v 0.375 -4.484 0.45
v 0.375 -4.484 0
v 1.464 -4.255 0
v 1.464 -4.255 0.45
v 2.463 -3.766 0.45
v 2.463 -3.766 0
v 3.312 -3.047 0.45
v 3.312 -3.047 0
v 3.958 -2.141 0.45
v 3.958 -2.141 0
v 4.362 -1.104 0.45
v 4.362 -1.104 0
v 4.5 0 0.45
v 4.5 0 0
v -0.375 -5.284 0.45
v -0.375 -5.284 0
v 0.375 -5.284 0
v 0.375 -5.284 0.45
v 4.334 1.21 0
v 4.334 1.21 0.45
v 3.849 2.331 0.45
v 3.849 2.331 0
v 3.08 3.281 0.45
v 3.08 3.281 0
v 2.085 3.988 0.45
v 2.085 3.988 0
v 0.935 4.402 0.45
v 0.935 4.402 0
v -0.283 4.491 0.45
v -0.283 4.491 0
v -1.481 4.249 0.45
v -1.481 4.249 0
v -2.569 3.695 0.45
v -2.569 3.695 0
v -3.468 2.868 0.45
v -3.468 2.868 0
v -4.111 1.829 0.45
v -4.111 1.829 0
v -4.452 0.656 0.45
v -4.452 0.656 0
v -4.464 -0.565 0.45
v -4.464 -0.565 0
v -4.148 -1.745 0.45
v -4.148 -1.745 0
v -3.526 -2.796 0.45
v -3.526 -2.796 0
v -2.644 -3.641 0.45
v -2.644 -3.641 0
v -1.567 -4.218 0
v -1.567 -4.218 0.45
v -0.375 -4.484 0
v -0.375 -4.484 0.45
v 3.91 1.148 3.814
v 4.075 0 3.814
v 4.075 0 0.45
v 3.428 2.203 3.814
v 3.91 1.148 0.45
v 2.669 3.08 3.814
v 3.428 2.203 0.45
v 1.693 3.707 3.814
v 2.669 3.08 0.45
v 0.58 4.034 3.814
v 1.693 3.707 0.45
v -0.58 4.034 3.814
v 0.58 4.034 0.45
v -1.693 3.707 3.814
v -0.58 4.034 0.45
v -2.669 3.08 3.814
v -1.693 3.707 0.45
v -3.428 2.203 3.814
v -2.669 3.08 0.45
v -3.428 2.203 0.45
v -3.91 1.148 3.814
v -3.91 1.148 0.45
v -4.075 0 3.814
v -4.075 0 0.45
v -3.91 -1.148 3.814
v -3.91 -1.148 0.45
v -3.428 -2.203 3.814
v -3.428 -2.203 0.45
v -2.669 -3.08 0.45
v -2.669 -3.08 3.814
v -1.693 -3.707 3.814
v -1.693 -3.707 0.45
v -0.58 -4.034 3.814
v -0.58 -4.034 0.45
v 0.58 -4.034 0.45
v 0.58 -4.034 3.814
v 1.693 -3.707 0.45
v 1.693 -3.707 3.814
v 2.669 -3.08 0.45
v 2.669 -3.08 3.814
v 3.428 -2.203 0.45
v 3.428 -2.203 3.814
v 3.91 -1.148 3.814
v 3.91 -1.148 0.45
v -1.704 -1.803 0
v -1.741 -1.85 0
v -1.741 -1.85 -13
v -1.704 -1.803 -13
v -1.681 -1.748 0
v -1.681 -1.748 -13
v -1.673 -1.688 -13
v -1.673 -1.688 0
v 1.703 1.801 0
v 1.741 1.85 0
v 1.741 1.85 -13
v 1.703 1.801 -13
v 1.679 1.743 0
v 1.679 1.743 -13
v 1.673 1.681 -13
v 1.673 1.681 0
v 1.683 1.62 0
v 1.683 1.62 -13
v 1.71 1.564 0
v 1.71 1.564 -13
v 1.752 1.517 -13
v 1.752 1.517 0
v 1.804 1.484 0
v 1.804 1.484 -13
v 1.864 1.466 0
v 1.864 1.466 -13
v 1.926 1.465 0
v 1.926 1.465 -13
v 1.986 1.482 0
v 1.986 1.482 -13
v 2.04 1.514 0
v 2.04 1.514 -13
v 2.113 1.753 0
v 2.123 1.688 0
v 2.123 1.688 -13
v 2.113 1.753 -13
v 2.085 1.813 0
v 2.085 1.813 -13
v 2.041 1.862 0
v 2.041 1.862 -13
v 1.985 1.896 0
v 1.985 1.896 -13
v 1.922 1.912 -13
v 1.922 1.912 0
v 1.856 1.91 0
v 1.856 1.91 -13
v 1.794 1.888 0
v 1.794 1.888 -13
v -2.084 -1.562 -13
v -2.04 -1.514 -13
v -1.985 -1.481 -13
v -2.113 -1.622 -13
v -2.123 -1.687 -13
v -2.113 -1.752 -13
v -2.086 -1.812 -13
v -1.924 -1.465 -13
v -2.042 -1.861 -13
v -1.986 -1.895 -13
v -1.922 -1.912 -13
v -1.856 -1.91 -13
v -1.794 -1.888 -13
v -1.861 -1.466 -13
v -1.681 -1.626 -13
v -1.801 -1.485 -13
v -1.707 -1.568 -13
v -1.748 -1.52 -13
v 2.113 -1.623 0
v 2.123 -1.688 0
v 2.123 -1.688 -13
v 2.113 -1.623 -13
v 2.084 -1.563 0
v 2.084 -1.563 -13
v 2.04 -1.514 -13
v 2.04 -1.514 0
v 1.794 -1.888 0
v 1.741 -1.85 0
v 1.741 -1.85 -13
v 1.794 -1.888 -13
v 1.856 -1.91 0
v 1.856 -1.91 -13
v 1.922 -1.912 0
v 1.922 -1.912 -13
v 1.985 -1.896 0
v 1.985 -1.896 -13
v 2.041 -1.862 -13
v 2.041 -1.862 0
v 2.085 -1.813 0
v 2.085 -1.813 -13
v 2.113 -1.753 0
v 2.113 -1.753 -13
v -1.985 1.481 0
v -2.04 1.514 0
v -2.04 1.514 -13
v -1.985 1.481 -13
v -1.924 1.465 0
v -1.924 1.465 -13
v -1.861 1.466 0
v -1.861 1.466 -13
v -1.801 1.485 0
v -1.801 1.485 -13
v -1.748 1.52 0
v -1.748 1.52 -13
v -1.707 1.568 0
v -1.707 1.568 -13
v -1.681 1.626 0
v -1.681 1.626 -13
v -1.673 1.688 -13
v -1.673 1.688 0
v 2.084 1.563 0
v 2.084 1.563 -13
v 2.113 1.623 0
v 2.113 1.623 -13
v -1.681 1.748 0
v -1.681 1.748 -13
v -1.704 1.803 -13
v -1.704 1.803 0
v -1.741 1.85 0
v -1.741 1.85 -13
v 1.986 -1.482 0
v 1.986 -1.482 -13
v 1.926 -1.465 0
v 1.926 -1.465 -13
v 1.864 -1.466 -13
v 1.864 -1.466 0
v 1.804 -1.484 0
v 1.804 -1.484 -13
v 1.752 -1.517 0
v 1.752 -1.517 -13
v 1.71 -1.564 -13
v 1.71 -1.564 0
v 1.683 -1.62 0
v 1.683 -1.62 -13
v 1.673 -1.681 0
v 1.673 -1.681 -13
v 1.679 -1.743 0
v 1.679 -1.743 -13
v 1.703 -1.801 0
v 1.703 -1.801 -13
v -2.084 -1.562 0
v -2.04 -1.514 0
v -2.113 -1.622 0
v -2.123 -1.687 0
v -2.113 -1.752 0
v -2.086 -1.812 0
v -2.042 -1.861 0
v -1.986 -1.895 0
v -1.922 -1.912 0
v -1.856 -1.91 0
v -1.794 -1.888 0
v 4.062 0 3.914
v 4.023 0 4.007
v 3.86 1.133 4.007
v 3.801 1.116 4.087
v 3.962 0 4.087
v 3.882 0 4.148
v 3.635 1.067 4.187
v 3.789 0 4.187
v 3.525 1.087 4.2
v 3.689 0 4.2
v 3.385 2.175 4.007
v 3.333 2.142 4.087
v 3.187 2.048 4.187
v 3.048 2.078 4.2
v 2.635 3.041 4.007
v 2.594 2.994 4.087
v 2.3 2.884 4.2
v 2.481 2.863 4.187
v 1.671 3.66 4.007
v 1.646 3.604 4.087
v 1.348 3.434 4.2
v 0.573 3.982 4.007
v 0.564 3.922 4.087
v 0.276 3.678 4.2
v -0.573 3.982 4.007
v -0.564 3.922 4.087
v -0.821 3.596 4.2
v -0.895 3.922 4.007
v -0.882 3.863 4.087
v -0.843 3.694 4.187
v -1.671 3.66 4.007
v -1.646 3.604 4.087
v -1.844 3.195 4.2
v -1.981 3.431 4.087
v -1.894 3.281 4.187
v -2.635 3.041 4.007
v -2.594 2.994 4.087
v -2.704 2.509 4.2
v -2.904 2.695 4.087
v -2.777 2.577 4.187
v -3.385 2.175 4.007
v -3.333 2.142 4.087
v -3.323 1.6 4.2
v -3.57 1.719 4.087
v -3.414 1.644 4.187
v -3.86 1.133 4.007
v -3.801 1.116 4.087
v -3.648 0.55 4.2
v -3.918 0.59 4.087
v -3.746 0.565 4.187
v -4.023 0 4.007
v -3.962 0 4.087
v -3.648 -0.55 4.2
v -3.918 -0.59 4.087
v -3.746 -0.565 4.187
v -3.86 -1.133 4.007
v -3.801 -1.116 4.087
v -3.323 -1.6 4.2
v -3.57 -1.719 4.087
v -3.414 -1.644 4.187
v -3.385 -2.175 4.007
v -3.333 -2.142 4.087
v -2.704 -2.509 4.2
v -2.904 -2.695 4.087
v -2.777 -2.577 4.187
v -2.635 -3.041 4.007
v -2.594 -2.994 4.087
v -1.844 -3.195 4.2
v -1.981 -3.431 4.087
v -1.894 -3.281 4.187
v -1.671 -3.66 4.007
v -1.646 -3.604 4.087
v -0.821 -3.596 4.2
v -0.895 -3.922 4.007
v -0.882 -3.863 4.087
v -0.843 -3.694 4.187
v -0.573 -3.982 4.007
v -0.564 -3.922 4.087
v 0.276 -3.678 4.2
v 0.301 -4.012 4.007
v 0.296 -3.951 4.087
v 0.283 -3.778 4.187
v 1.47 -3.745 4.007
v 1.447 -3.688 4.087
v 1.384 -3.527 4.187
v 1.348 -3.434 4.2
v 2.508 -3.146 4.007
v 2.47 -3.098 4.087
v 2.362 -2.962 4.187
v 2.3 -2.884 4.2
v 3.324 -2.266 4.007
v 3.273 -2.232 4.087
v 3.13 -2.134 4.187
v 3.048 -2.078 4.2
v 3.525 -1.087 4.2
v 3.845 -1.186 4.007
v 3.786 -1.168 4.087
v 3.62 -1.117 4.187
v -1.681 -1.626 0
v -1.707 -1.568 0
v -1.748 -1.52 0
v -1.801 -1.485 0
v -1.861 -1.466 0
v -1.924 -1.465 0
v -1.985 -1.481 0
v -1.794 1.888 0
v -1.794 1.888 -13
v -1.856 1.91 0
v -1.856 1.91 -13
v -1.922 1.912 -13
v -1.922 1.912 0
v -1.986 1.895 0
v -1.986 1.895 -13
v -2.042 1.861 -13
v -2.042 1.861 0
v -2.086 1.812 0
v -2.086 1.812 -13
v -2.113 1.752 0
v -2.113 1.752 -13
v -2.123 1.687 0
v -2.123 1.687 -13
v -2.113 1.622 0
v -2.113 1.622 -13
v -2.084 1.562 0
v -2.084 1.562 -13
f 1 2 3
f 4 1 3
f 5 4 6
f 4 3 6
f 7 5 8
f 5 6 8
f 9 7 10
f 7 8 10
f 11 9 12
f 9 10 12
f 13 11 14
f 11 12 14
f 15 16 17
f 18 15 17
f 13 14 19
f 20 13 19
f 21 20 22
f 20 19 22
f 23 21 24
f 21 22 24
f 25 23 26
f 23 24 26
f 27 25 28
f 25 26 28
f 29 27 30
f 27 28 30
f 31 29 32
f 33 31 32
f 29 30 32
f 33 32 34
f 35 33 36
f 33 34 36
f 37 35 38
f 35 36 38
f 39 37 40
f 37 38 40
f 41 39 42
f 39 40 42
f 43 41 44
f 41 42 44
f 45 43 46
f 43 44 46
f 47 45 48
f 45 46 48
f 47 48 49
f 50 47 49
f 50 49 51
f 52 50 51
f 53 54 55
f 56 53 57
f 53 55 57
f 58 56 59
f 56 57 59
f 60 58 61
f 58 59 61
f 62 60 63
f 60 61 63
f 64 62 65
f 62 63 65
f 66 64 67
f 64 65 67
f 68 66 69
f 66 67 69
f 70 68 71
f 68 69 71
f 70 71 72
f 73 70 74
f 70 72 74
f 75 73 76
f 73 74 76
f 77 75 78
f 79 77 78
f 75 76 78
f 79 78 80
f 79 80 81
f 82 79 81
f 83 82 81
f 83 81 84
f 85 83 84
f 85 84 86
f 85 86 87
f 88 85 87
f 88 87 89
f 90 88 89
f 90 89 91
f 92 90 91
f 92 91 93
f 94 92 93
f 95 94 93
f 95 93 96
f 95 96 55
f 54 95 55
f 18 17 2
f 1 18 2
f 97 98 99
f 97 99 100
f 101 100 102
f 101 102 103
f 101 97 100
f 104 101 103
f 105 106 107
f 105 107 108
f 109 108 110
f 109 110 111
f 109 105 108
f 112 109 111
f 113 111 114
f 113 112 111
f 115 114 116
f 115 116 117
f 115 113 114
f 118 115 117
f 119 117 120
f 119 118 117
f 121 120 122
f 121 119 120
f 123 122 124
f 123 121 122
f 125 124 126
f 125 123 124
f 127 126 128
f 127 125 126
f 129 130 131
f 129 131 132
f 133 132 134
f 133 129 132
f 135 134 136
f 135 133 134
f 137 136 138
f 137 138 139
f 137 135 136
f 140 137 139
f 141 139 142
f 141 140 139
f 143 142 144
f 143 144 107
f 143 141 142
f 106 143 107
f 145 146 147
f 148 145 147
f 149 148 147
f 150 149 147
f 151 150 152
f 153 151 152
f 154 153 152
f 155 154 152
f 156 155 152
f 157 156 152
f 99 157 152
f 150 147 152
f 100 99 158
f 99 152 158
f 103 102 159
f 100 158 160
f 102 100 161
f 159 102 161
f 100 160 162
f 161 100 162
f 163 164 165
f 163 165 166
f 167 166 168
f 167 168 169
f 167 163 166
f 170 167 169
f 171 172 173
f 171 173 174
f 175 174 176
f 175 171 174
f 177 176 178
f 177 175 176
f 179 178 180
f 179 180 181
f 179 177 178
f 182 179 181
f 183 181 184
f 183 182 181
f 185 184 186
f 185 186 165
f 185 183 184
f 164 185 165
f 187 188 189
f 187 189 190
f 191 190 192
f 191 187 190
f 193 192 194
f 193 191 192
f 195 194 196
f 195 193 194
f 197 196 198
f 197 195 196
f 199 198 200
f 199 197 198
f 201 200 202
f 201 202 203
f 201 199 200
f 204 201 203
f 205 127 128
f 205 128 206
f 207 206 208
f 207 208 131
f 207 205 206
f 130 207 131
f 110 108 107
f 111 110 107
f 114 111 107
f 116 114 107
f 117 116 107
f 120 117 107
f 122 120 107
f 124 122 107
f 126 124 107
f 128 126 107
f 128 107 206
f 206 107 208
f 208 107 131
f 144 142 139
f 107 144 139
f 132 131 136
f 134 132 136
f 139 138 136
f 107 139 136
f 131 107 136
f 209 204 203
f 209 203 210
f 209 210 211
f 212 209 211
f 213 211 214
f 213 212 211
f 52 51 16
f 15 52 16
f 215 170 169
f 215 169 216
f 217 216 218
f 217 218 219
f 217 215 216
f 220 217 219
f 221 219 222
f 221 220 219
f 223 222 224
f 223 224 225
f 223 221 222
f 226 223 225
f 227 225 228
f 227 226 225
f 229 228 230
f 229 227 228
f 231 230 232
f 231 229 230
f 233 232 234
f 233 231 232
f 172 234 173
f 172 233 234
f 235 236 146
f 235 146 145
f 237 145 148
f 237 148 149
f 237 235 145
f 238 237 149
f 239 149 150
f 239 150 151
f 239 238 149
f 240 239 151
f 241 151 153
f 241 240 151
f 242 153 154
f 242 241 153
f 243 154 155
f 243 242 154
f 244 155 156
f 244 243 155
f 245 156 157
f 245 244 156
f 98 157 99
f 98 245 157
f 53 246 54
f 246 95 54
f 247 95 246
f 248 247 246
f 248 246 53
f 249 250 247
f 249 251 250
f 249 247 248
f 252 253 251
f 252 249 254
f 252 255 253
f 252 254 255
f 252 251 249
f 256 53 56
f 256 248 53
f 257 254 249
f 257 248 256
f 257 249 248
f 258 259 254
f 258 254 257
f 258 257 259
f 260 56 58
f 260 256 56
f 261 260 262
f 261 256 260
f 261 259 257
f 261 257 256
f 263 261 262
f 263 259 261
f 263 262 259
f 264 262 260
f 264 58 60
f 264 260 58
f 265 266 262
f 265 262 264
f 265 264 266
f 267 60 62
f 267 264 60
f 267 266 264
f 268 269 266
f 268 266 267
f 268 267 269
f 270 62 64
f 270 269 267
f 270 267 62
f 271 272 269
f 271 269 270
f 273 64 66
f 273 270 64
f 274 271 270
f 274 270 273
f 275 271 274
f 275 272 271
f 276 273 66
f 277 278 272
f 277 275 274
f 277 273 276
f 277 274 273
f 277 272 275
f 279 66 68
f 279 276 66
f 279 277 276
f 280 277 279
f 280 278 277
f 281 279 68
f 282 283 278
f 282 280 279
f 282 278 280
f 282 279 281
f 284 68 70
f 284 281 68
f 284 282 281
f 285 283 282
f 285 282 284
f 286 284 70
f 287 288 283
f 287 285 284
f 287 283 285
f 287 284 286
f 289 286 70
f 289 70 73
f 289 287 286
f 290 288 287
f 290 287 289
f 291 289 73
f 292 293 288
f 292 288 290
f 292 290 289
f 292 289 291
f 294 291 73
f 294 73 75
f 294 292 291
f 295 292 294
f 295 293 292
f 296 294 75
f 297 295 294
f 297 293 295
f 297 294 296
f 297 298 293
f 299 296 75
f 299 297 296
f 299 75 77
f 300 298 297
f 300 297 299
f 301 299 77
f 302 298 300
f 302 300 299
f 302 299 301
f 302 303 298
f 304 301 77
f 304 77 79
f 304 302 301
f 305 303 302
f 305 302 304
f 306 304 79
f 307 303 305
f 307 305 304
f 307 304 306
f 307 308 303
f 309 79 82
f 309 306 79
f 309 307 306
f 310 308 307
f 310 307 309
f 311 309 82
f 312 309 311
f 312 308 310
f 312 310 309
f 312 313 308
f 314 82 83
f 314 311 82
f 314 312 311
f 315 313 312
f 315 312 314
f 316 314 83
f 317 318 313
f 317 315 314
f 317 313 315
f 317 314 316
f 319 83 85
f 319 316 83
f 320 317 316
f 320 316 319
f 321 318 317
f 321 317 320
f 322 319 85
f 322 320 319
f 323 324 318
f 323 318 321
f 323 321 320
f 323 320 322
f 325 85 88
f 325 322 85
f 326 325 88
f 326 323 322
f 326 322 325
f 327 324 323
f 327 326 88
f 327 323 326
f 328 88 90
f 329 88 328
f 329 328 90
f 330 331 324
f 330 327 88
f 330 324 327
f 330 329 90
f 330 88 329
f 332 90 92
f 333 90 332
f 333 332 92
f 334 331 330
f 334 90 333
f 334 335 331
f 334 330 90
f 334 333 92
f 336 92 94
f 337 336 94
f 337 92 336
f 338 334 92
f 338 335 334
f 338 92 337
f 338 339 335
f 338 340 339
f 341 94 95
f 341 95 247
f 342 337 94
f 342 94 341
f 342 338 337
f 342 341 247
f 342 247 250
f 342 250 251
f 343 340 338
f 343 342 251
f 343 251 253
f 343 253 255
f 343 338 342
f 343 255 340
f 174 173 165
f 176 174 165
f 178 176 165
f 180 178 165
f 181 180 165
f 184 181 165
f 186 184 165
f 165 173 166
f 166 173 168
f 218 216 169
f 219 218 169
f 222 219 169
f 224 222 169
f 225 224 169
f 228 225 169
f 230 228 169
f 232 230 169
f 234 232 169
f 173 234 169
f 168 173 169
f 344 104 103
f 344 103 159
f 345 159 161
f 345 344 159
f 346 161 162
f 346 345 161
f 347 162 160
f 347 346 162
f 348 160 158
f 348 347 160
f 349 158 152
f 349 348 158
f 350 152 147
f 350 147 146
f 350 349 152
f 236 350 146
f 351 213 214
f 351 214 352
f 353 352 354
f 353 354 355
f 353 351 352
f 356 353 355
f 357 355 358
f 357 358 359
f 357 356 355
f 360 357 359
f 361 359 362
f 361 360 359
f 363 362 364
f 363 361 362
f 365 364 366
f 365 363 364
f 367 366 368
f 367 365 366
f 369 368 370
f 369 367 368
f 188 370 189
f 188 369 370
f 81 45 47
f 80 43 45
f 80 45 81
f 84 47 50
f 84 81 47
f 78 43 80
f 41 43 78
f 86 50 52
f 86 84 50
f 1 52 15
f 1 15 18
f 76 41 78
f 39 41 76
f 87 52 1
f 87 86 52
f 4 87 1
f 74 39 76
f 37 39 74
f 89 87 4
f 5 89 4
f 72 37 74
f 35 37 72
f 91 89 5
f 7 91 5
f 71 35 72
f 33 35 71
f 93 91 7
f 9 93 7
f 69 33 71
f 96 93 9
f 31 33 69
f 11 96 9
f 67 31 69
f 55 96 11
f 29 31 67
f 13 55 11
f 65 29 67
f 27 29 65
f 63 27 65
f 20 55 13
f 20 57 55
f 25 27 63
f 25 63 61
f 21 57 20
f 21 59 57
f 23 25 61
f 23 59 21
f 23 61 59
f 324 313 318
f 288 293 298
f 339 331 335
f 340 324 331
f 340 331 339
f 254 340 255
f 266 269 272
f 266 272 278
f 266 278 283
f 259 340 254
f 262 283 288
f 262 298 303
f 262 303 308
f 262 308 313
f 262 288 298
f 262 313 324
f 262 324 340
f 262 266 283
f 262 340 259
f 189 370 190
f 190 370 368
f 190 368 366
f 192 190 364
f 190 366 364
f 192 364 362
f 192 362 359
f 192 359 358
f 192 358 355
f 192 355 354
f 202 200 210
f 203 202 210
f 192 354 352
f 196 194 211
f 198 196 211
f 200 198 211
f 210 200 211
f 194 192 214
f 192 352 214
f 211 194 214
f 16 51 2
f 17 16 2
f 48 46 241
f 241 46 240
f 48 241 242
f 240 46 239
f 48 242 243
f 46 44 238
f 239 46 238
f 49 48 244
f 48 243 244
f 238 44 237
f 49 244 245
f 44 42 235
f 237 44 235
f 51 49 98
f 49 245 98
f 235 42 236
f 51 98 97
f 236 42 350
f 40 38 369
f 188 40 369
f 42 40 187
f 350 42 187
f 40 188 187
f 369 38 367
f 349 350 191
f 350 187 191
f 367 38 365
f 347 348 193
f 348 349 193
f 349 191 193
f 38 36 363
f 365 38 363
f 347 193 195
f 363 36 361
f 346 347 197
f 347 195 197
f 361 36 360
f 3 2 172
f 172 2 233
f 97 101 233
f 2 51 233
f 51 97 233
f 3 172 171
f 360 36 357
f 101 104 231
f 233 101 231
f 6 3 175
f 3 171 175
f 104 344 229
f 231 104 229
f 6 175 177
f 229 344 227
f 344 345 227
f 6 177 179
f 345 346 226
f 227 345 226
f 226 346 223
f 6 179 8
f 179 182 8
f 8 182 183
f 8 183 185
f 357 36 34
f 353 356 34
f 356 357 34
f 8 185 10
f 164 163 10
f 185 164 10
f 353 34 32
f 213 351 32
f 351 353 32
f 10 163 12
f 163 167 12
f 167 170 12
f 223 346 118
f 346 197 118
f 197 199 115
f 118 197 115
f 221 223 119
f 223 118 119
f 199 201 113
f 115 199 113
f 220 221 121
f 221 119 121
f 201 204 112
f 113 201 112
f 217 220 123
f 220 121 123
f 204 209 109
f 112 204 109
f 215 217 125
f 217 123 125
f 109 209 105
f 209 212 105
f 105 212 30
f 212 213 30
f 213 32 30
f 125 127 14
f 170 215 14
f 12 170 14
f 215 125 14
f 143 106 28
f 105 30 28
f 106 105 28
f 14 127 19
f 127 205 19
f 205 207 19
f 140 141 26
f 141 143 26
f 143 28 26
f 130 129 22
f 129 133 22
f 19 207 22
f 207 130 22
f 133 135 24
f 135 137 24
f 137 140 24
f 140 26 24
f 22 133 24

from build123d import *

# Parameters (mm, degrees)
F0_R     = 4.075
F1_DEPTH = 0.45
F2_DEPTH = 4.2
F3_DEPTH = 13
F4_R     = 0.38627417


with BuildPart() as f1:
    # F0 (on Top) → F1 (new body)
    with BuildSketch(Plane.XY):
        with BuildLine():
            ThreePointArc((0.375, -4.4843477787), (3.3119103249, -3.0465144017), (4.5, 0))
            ThreePointArc((4.5, 0), (-3.0465144017, 3.3119103249), (-0.375, -4.4843477787))
            ThreePointArc((-0.375, -4.4843477787), (0, -4.5), (0.375, -4.4843477787))
        make_face()
        Circle(F0_R, mode=Mode.SUBTRACT)
        Circle(F0_R)
        with BuildLine():
            ThreePointArc((2.0395831107, 1.5138364292), (2.4116530743, 0.7972010094), (2.54, 0))
            ThreePointArc((2.54, 0), (2.4116530743, -0.7972010094), (2.0395831107, -1.5138364292))
            ThreePointArc((2.0395831107, -1.5138364292), (2.1007978618, -1.5917433661), (2.1226128319, -1.6883914061))
            ThreePointArc((2.1226128319, -1.6883914061), (1.9851666901, -1.8956577128), (1.7407521927, -1.8496977601))
            ThreePointArc((1.7407521927, -1.8496977601), (0, -2.54), (-1.7407521927, -1.8496977601))
            ThreePointArc((-1.7407521927, -1.8496977601), (-2.0657084568, -1.8379536369), (-2.0395831107, -1.5138364292))
            ThreePointArc((-2.0395831107, -1.5138364292), (-2.54, 0), (-2.0395831107, 1.5138364292))
            ThreePointArc((-2.0395831107, 1.5138364292), (-2.0657084568, 1.8379536369), (-1.7407521927, 1.8496977601))
            ThreePointArc((-1.7407521927, 1.8496977601), (0, 2.54), (1.7407521927, 1.8496977601))
            ThreePointArc((1.7407521927, 1.8496977601), (1.9851666901, 1.8956577128), (2.1226128319, 1.6883914061))
            ThreePointArc((2.1226128319, 1.6883914061), (2.1007978618, 1.5917433661), (2.0395831107, 1.5138364292))
        make_face(mode=Mode.SUBTRACT)
        with BuildLine():
            ThreePointArc((2.0395831107, -1.5138364292), (2.4116530743, -0.7972010094), (2.54, 0))
            ThreePointArc((2.54, 0), (2.4116530743, 0.7972010094), (2.0395831107, 1.5138364292))
            ThreePointArc((2.0395831107, 1.5138364292), (1.729517207, 1.5388291752), (1.7407521927, 1.8496977601))
            ThreePointArc((1.7407521927, 1.8496977601), (0, 2.54), (-1.7407521927, 1.8496977601))
            ThreePointArc((-1.7407521927, 1.8496977601), (-1.6903465252, 1.7759452643), (-1.6726128319, 1.6883914061))
            ThreePointArc((-1.6726128319, 1.6883914061), (-1.8009647919, 1.4852063762), (-2.0395831107, 1.5138364292))
            ThreePointArc((-2.0395831107, 1.5138364292), (-2.54, 0), (-2.0395831107, -1.5138364292))
            ThreePointArc((-2.0395831107, -1.5138364292), (-1.8009647919, -1.4852063762), (-1.6726128319, -1.6883914061))
            ThreePointArc((-1.6726128319, -1.6883914061), (-1.6903465252, -1.7759452643), (-1.7407521927, -1.8496977601))
            ThreePointArc((-1.7407521927, -1.8496977601), (0, -2.54), (1.7407521927, -1.8496977601))
            ThreePointArc((1.7407521927, -1.8496977601), (1.729517207, -1.5388291752), (2.0395831107, -1.5138364292))
        make_face()
        with BuildLine():
            ThreePointArc((0.375, -4.4843477787), (0, -4.5), (-0.375, -4.4843477787))
            Line((-0.375, -4.4843477787), (-0.375, -5.2843477787))
            Line((-0.375, -5.2843477787), (0.375, -5.2843477787))
            Line((0.375, -5.2843477787), (0.375, -4.4843477787))
        make_face()
        with BuildLine():
            ThreePointArc((-2.0395831107, 1.5138364292), (-1.8976128319, 1.6883914061), (-1.7407521927, 1.8496977601))
            ThreePointArc((-1.7407521927, 1.8496977601), (-2.0657084568, 1.8379536369), (-2.0395831107, 1.5138364292))
        make_face()
        with BuildLine():
            ThreePointArc((1.7407521927, 1.8496977601), (1.8976128319, 1.6883914061), (2.0395831107, 1.5138364292))
            ThreePointArc((2.0395831107, 1.5138364292), (2.1007978618, 1.5917433661), (2.1226128319, 1.6883914061))
            ThreePointArc((2.1226128319, 1.6883914061), (1.9851666901, 1.8956577128), (1.7407521927, 1.8496977601))
        make_face()
        with BuildLine():
            ThreePointArc((2.1226128319, -1.6883914061), (2.1007978618, -1.5917433661), (2.0395831107, -1.5138364292))
            ThreePointArc((2.0395831107, -1.5138364292), (1.8976128319, -1.6883914061), (1.7407521927, -1.8496977601))
            ThreePointArc((1.7407521927, -1.8496977601), (1.9851666901, -1.8956577128), (2.1226128319, -1.6883914061))
        make_face()
        with BuildLine():
            ThreePointArc((-2.0395831107, -1.5138364292), (-2.0657084568, -1.8379536369), (-1.7407521927, -1.8496977601))
            ThreePointArc((-1.7407521927, -1.8496977601), (-1.8976128319, -1.6883914061), (-2.0395831107, -1.5138364292))
        make_face()
        with BuildLine():
            ThreePointArc((-1.6726128319, 1.6883914061), (-1.6903465252, 1.7759452643), (-1.7407521927, 1.8496977601))
            ThreePointArc((-1.7407521927, 1.8496977601), (-1.8976128319, 1.6883914061), (-2.0395831107, 1.5138364292))
            ThreePointArc((-2.0395831107, 1.5138364292), (-1.8009647919, 1.4852063762), (-1.6726128319, 1.6883914061))
        make_face()
        with BuildLine():
            ThreePointArc((1.7407521927, 1.8496977601), (1.729517207, 1.5388291752), (2.0395831107, 1.5138364292))
            ThreePointArc((2.0395831107, 1.5138364292), (1.8976128319, 1.6883914061), (1.7407521927, 1.8496977601))
        make_face()
        with BuildLine():
            ThreePointArc((1.7407521927, -1.8496977601), (1.8976128319, -1.6883914061), (2.0395831107, -1.5138364292))
            ThreePointArc((2.0395831107, -1.5138364292), (1.729517207, -1.5388291752), (1.7407521927, -1.8496977601))
        make_face()
        with BuildLine():
            ThreePointArc((-2.0395831107, -1.5138364292), (-1.8976128319, -1.6883914061), (-1.7407521927, -1.8496977601))
            ThreePointArc((-1.7407521927, -1.8496977601), (-1.6903465252, -1.7759452643), (-1.6726128319, -1.6883914061))
            ThreePointArc((-1.6726128319, -1.6883914061), (-1.8009647919, -1.4852063762), (-2.0395831107, -1.5138364292))
        make_face()
    extrude(amount=F1_DEPTH)

    # F0 (on Top) → F2 (join)
    with BuildSketch(Plane.XY):
        Circle(F0_R)
        with BuildLine():
            ThreePointArc((2.0395831107, 1.5138364292), (2.4116530743, 0.7972010094), (2.54, 0))
            ThreePointArc((2.54, 0), (2.4116530743, -0.7972010094), (2.0395831107, -1.5138364292))
            ThreePointArc((2.0395831107, -1.5138364292), (2.1007978618, -1.5917433661), (2.1226128319, -1.6883914061))
            ThreePointArc((2.1226128319, -1.6883914061), (1.9851666901, -1.8956577128), (1.7407521927, -1.8496977601))
            ThreePointArc((1.7407521927, -1.8496977601), (0, -2.54), (-1.7407521927, -1.8496977601))
            ThreePointArc((-1.7407521927, -1.8496977601), (-2.0657084568, -1.8379536369), (-2.0395831107, -1.5138364292))
            ThreePointArc((-2.0395831107, -1.5138364292), (-2.54, 0), (-2.0395831107, 1.5138364292))
            ThreePointArc((-2.0395831107, 1.5138364292), (-2.0657084568, 1.8379536369), (-1.7407521927, 1.8496977601))
            ThreePointArc((-1.7407521927, 1.8496977601), (0, 2.54), (1.7407521927, 1.8496977601))
            ThreePointArc((1.7407521927, 1.8496977601), (1.9851666901, 1.8956577128), (2.1226128319, 1.6883914061))
            ThreePointArc((2.1226128319, 1.6883914061), (2.1007978618, 1.5917433661), (2.0395831107, 1.5138364292))
        make_face(mode=Mode.SUBTRACT)
        with BuildLine():
            ThreePointArc((2.0395831107, -1.5138364292), (2.4116530743, -0.7972010094), (2.54, 0))
            ThreePointArc((2.54, 0), (2.4116530743, 0.7972010094), (2.0395831107, 1.5138364292))
            ThreePointArc((2.0395831107, 1.5138364292), (1.729517207, 1.5388291752), (1.7407521927, 1.8496977601))
            ThreePointArc((1.7407521927, 1.8496977601), (0, 2.54), (-1.7407521927, 1.8496977601))
            ThreePointArc((-1.7407521927, 1.8496977601), (-1.6903465252, 1.7759452643), (-1.6726128319, 1.6883914061))
            ThreePointArc((-1.6726128319, 1.6883914061), (-1.8009647919, 1.4852063762), (-2.0395831107, 1.5138364292))
            ThreePointArc((-2.0395831107, 1.5138364292), (-2.54, 0), (-2.0395831107, -1.5138364292))
            ThreePointArc((-2.0395831107, -1.5138364292), (-1.8009647919, -1.4852063762), (-1.6726128319, -1.6883914061))
            ThreePointArc((-1.6726128319, -1.6883914061), (-1.6903465252, -1.7759452643), (-1.7407521927, -1.8496977601))
            ThreePointArc((-1.7407521927, -1.8496977601), (0, -2.54), (1.7407521927, -1.8496977601))
            ThreePointArc((1.7407521927, -1.8496977601), (1.729517207, -1.5388291752), (2.0395831107, -1.5138364292))
        make_face()
        with BuildLine():
            ThreePointArc((1.7407521927, 1.8496977601), (1.8976128319, 1.6883914061), (2.0395831107, 1.5138364292))
            ThreePointArc((2.0395831107, 1.5138364292), (2.1007978618, 1.5917433661), (2.1226128319, 1.6883914061))
            ThreePointArc((2.1226128319, 1.6883914061), (1.9851666901, 1.8956577128), (1.7407521927, 1.8496977601))
        make_face()
        with BuildLine():
            ThreePointArc((1.7407521927, 1.8496977601), (1.729517207, 1.5388291752), (2.0395831107, 1.5138364292))
            ThreePointArc((2.0395831107, 1.5138364292), (1.8976128319, 1.6883914061), (1.7407521927, 1.8496977601))
        make_face()
        with BuildLine():
            ThreePointArc((-2.0395831107, -1.5138364292), (-1.8976128319, -1.6883914061), (-1.7407521927, -1.8496977601))
            ThreePointArc((-1.7407521927, -1.8496977601), (-1.6903465252, -1.7759452643), (-1.6726128319, -1.6883914061))
            ThreePointArc((-1.6726128319, -1.6883914061), (-1.8009647919, -1.4852063762), (-2.0395831107, -1.5138364292))
        make_face()
        with BuildLine():
            ThreePointArc((-2.0395831107, 1.5138364292), (-1.8976128319, 1.6883914061), (-1.7407521927, 1.8496977601))
            ThreePointArc((-1.7407521927, 1.8496977601), (-2.0657084568, 1.8379536369), (-2.0395831107, 1.5138364292))
        make_face()
        with BuildLine():
            ThreePointArc((-1.6726128319, 1.6883914061), (-1.6903465252, 1.7759452643), (-1.7407521927, 1.8496977601))
            ThreePointArc((-1.7407521927, 1.8496977601), (-1.8976128319, 1.6883914061), (-2.0395831107, 1.5138364292))
            ThreePointArc((-2.0395831107, 1.5138364292), (-1.8009647919, 1.4852063762), (-1.6726128319, 1.6883914061))
        make_face()
        with BuildLine():
            ThreePointArc((2.1226128319, -1.6883914061), (2.1007978618, -1.5917433661), (2.0395831107, -1.5138364292))
            ThreePointArc((2.0395831107, -1.5138364292), (1.8976128319, -1.6883914061), (1.7407521927, -1.8496977601))
            ThreePointArc((1.7407521927, -1.8496977601), (1.9851666901, -1.8956577128), (2.1226128319, -1.6883914061))
        make_face()
        with BuildLine():
            ThreePointArc((1.7407521927, -1.8496977601), (1.8976128319, -1.6883914061), (2.0395831107, -1.5138364292))
            ThreePointArc((2.0395831107, -1.5138364292), (1.729517207, -1.5388291752), (1.7407521927, -1.8496977601))
        make_face()
        with BuildLine():
            ThreePointArc((-2.0395831107, -1.5138364292), (-2.0657084568, -1.8379536369), (-1.7407521927, -1.8496977601))
            ThreePointArc((-1.7407521927, -1.8496977601), (-1.8976128319, -1.6883914061), (-2.0395831107, -1.5138364292))
        make_face()
    extrude(amount=F2_DEPTH)

    # F0 (on Top) → F3 (join)
    with BuildSketch(Plane.XY):
        with BuildLine():
            ThreePointArc((1.7407521927, 1.8496977601), (1.8976128319, 1.6883914061), (2.0395831107, 1.5138364292))
            ThreePointArc((2.0395831107, 1.5138364292), (2.1007978618, 1.5917433661), (2.1226128319, 1.6883914061))
            ThreePointArc((2.1226128319, 1.6883914061), (1.9851666901, 1.8956577128), (1.7407521927, 1.8496977601))
        make_face()
        with BuildLine():
            ThreePointArc((1.7407521927, 1.8496977601), (1.729517207, 1.5388291752), (2.0395831107, 1.5138364292))
            ThreePointArc((2.0395831107, 1.5138364292), (1.8976128319, 1.6883914061), (1.7407521927, 1.8496977601))
        make_face()
        with BuildLine():
            ThreePointArc((2.1226128319, -1.6883914061), (2.1007978618, -1.5917433661), (2.0395831107, -1.5138364292))
            ThreePointArc((2.0395831107, -1.5138364292), (1.8976128319, -1.6883914061), (1.7407521927, -1.8496977601))
            ThreePointArc((1.7407521927, -1.8496977601), (1.9851666901, -1.8956577128), (2.1226128319, -1.6883914061))
        make_face()
        with BuildLine():
            ThreePointArc((1.7407521927, -1.8496977601), (1.8976128319, -1.6883914061), (2.0395831107, -1.5138364292))
            ThreePointArc((2.0395831107, -1.5138364292), (1.729517207, -1.5388291752), (1.7407521927, -1.8496977601))
        make_face()
        with BuildLine():
            ThreePointArc((-1.6726128319, 1.6883914061), (-1.6903465252, 1.7759452643), (-1.7407521927, 1.8496977601))
            ThreePointArc((-1.7407521927, 1.8496977601), (-1.8976128319, 1.6883914061), (-2.0395831107, 1.5138364292))
            ThreePointArc((-2.0395831107, 1.5138364292), (-1.8009647919, 1.4852063762), (-1.6726128319, 1.6883914061))
        make_face()
        with BuildLine():
            ThreePointArc((-2.0395831107, 1.5138364292), (-1.8976128319, 1.6883914061), (-1.7407521927, 1.8496977601))
            ThreePointArc((-1.7407521927, 1.8496977601), (-2.0657084568, 1.8379536369), (-2.0395831107, 1.5138364292))
        make_face()
        with BuildLine():
            ThreePointArc((-2.0395831107, -1.5138364292), (-1.8976128319, -1.6883914061), (-1.7407521927, -1.8496977601))
            ThreePointArc((-1.7407521927, -1.8496977601), (-1.6903465252, -1.7759452643), (-1.6726128319, -1.6883914061))
            ThreePointArc((-1.6726128319, -1.6883914061), (-1.8009647919, -1.4852063762), (-2.0395831107, -1.5138364292))
        make_face()
        with BuildLine():
            ThreePointArc((-2.0395831107, -1.5138364292), (-2.0657084568, -1.8379536369), (-1.7407521927, -1.8496977601))
            ThreePointArc((-1.7407521927, -1.8496977601), (-1.8976128319, -1.6883914061), (-2.0395831107, -1.5138364292))
        make_face()
    extrude(amount=-F3_DEPTH)

    # F4
    f4_edges = [f1.edges().sort_by_distance(p)[0] for p in [
        (-4.075, 0, 4.2),
    ]]
    fillet(f4_edges, radius=F4_R)


solid = f1.part
